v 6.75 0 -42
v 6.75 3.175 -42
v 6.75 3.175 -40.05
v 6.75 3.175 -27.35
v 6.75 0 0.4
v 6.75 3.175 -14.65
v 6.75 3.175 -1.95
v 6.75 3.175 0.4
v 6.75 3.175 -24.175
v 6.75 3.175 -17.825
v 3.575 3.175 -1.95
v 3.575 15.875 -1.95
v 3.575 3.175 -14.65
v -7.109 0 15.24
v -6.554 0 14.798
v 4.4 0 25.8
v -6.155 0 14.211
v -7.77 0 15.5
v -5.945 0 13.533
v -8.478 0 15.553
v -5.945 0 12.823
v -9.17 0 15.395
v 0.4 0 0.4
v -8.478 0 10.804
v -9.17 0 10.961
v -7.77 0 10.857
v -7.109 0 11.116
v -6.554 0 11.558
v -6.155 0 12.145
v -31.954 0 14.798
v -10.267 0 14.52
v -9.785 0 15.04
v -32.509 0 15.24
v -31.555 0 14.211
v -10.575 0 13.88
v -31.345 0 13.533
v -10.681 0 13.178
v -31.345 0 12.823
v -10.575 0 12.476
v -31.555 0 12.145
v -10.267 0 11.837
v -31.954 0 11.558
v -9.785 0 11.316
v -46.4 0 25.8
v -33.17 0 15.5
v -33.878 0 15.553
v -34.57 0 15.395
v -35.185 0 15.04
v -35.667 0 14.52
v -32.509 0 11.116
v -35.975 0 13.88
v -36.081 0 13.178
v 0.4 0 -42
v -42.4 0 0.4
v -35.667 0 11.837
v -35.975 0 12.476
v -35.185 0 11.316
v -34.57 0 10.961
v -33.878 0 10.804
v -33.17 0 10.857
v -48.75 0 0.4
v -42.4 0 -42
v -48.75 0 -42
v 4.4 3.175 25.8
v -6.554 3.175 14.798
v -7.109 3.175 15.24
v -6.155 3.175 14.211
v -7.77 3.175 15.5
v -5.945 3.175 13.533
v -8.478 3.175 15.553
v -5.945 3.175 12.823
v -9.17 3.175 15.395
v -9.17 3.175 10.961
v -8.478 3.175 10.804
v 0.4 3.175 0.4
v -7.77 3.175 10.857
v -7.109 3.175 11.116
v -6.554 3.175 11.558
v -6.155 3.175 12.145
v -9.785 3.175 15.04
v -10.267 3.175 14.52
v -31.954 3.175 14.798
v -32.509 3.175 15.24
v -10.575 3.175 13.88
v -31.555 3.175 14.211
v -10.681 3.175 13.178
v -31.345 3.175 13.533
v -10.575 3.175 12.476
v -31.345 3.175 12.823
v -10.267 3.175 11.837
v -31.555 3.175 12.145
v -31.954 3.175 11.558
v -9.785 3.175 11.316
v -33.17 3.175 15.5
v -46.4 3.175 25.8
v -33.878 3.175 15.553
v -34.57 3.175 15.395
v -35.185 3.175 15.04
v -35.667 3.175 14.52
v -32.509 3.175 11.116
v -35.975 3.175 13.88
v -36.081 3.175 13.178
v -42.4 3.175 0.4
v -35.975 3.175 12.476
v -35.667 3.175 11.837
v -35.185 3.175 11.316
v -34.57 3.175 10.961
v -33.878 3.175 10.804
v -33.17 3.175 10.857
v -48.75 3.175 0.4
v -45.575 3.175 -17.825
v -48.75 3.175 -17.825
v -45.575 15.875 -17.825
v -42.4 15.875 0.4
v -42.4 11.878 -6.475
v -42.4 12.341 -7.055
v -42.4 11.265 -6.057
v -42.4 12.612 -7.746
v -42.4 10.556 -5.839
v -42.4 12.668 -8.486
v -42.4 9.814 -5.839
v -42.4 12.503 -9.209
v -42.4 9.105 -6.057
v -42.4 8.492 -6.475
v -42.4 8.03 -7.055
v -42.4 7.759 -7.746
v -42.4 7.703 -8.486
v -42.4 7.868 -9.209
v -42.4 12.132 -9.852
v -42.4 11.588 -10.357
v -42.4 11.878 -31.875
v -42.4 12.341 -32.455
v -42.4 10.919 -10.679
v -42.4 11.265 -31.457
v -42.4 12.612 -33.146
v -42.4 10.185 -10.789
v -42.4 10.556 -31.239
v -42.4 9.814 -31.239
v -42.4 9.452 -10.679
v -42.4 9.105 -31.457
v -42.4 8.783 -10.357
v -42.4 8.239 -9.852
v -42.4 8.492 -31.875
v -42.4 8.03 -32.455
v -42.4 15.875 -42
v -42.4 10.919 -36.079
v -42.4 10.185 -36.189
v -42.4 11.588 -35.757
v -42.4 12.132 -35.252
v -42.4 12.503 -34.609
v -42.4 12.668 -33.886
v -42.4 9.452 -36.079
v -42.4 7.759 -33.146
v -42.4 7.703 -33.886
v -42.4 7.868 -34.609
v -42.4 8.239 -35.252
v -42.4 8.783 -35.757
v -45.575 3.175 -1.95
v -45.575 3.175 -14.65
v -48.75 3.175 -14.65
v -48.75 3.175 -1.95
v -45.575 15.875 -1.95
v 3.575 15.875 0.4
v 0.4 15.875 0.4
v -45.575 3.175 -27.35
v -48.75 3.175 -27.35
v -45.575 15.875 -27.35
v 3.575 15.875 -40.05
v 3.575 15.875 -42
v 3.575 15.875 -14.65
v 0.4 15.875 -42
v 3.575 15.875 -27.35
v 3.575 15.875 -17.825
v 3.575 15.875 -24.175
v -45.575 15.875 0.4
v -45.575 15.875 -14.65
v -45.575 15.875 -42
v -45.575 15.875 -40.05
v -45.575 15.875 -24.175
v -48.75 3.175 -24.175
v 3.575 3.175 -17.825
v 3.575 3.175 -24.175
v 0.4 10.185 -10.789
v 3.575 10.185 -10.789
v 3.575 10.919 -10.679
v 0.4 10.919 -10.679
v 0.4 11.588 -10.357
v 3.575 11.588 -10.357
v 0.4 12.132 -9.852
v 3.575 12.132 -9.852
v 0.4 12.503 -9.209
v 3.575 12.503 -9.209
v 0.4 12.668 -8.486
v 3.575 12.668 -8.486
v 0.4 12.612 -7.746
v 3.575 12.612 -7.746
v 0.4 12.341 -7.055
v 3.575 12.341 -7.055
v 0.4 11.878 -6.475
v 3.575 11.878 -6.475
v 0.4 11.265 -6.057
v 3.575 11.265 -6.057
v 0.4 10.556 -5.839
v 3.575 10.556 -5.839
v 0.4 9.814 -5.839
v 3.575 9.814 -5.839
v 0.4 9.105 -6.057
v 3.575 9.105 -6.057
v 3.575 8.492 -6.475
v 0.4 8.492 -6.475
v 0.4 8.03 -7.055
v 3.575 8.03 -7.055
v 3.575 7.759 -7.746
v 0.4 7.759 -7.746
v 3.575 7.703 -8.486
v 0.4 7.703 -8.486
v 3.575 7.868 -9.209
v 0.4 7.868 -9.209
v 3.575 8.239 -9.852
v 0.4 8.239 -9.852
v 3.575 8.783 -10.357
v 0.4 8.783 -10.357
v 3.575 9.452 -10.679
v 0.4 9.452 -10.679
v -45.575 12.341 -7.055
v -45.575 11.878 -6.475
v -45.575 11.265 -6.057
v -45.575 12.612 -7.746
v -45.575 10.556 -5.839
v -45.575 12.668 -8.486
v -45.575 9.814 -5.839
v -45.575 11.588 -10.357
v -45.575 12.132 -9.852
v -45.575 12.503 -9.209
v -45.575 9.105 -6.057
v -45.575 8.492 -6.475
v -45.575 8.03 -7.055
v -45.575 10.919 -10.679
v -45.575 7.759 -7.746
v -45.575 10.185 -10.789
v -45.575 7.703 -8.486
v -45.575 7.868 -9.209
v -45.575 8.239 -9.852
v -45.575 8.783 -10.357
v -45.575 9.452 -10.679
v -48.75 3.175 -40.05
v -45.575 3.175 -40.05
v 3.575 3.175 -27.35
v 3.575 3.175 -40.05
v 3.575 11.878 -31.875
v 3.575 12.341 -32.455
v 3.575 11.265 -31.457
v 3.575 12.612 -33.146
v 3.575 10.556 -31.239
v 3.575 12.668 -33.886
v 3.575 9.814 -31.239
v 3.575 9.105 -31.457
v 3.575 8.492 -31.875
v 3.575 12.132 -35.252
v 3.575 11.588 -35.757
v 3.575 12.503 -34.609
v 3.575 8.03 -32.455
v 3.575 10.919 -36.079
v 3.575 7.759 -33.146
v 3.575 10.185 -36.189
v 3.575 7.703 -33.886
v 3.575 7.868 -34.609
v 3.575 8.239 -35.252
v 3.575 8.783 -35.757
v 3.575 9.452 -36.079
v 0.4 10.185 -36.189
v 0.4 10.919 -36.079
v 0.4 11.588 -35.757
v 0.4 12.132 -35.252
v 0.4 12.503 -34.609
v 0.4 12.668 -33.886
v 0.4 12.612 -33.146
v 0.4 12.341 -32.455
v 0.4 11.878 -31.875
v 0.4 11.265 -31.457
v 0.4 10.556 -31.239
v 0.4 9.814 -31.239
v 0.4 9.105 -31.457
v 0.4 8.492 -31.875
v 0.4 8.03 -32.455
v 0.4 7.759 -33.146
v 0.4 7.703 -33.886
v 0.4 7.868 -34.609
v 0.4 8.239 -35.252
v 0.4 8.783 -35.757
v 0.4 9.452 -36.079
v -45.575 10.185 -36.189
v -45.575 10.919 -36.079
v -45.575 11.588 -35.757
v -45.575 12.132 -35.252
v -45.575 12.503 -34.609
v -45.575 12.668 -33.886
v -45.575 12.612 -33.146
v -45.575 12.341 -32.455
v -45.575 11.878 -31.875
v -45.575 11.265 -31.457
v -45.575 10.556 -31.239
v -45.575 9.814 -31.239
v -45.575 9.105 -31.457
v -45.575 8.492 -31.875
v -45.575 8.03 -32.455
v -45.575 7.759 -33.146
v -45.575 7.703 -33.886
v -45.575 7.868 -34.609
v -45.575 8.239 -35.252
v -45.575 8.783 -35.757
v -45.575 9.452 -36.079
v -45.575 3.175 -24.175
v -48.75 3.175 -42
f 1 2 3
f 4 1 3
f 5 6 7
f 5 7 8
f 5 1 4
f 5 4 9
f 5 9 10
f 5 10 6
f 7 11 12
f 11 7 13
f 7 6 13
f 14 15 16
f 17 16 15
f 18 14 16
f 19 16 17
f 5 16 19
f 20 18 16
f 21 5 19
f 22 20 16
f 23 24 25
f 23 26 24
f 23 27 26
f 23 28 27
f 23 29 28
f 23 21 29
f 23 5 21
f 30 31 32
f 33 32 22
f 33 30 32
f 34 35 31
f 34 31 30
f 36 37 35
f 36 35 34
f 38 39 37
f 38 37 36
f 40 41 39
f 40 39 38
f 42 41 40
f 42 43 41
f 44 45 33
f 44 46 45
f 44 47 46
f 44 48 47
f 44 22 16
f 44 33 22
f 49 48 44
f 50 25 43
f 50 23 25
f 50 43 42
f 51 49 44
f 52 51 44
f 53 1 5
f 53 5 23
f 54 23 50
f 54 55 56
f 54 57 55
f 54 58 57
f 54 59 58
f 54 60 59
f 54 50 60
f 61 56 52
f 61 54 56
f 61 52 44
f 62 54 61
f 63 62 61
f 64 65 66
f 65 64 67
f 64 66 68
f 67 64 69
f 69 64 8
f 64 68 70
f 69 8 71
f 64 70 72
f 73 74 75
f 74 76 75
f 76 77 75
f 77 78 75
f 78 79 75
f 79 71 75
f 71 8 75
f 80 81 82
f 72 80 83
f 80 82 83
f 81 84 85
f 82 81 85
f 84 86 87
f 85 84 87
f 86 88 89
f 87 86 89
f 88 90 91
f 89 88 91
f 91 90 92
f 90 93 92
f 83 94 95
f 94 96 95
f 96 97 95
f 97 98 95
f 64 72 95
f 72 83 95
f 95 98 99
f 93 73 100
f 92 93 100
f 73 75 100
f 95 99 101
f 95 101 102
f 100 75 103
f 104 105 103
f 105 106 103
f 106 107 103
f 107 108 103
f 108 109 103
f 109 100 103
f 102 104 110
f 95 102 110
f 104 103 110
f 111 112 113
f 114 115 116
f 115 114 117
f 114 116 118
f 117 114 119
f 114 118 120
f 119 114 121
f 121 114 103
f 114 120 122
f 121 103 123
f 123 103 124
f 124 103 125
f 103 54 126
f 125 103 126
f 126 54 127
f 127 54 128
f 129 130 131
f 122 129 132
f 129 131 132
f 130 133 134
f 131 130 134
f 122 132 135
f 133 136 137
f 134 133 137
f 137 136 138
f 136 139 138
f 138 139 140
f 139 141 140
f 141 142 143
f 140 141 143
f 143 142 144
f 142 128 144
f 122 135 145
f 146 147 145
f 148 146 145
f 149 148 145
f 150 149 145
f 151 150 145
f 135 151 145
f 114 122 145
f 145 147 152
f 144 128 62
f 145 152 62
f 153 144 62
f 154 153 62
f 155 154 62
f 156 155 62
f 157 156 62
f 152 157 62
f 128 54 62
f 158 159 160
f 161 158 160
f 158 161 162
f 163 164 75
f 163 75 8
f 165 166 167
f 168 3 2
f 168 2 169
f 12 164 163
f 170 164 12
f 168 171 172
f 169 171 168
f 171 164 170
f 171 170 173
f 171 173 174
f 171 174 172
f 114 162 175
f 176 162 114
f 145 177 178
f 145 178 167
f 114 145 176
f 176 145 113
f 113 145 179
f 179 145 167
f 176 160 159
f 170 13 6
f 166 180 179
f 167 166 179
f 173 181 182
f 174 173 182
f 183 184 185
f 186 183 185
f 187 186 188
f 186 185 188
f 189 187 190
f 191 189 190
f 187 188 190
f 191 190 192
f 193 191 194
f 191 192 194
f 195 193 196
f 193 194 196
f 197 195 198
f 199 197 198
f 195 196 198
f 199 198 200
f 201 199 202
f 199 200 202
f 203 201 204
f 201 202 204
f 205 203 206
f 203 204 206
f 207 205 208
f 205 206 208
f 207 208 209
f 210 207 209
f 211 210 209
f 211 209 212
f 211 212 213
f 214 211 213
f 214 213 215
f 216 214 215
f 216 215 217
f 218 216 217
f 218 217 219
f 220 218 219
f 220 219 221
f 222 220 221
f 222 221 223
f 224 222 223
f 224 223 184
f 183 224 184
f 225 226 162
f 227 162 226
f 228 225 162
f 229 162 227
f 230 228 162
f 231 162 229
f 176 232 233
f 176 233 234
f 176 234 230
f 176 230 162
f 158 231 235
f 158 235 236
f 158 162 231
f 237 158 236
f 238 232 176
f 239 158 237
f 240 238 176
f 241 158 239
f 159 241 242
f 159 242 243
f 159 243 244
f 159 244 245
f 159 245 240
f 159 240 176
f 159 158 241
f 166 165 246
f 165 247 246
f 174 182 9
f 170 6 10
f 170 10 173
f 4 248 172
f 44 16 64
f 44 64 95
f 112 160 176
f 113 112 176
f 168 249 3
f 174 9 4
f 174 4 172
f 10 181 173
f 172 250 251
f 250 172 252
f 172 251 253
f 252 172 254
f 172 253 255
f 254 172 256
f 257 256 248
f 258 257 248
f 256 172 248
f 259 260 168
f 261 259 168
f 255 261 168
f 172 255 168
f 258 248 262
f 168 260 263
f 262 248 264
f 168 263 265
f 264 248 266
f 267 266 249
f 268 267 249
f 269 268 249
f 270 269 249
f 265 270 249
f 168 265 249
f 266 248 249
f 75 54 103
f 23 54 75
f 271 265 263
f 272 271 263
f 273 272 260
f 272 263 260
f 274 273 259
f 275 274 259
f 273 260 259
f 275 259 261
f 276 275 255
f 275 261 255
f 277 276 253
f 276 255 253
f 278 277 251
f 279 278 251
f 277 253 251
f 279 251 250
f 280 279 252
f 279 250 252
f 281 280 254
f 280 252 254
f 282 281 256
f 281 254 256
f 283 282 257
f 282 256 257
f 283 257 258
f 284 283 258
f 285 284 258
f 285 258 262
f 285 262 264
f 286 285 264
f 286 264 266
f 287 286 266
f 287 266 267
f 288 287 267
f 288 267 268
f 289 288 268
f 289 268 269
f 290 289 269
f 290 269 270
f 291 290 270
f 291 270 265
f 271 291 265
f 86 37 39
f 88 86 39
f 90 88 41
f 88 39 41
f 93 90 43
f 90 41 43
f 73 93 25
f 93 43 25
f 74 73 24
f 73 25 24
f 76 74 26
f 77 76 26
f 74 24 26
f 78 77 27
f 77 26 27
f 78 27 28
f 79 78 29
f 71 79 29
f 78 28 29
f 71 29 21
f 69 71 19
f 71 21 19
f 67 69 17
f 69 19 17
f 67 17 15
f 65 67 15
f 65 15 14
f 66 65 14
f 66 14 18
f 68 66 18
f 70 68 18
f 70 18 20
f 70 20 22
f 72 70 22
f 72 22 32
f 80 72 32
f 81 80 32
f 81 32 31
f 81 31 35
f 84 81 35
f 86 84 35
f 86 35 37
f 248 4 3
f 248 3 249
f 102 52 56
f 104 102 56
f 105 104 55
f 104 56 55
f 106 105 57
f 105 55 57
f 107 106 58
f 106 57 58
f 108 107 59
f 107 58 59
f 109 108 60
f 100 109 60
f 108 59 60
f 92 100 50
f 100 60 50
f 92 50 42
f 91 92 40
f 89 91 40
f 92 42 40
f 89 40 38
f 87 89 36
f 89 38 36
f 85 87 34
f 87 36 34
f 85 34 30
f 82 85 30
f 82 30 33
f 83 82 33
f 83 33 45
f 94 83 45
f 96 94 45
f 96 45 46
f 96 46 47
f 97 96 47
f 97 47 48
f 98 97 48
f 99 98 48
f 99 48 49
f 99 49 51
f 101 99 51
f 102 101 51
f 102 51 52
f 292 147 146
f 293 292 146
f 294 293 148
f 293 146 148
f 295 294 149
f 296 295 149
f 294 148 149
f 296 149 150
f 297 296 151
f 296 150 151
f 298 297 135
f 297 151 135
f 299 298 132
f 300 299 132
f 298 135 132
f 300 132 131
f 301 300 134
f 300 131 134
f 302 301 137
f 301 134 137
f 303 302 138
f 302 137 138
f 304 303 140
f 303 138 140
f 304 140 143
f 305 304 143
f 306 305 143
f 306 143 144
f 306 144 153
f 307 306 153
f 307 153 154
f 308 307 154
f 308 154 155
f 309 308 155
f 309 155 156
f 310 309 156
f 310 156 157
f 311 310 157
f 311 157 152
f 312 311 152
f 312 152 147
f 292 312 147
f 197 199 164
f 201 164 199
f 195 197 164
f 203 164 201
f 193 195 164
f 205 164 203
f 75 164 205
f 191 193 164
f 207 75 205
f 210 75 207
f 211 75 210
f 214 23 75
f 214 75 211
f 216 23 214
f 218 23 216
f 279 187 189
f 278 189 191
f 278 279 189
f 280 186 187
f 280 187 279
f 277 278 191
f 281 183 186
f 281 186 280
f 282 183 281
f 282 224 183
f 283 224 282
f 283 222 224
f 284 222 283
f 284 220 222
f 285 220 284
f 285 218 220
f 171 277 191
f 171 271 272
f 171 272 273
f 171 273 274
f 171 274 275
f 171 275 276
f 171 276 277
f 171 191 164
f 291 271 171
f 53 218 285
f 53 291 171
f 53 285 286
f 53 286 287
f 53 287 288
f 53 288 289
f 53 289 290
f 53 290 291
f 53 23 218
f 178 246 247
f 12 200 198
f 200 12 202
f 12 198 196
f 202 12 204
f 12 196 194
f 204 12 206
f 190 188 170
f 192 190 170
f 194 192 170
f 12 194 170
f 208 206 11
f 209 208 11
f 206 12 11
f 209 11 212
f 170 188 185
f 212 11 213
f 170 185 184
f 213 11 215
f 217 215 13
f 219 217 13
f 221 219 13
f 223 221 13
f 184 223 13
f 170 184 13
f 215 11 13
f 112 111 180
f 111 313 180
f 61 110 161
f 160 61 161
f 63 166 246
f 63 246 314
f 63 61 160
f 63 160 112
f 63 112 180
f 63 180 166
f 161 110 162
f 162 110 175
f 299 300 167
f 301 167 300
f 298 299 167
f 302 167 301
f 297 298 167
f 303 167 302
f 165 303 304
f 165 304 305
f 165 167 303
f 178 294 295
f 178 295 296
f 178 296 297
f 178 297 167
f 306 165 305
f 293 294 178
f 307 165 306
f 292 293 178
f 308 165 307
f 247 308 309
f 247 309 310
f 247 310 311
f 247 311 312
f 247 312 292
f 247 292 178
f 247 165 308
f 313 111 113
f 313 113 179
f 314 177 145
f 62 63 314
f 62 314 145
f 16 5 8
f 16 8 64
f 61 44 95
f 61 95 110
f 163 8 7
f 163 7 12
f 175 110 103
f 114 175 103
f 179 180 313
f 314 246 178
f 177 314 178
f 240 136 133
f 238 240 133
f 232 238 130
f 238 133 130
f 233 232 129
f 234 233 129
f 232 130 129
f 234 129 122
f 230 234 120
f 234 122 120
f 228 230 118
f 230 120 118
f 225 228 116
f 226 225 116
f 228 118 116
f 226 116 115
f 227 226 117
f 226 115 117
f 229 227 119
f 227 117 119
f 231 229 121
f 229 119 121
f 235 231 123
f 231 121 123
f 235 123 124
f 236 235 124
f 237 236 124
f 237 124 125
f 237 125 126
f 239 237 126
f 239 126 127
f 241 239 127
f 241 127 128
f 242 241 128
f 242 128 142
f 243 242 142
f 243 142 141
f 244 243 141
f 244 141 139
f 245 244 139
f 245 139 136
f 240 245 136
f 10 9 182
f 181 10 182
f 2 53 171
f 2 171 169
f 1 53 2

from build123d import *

# Parameters (mm, degrees)
BOSS_EXTRUDE1_DEPTH            = 3.175
F_3_16_0_1875_DIAMETER_HOLE1_D = 4.7625
SKETCH6_W                      = 3.175
SKETCH6_H                      = 12.7
BOSS_EXTRUDE2_DEPTH            = 12.7
F_9_0_196_DIAMETER_HOLE1_D     = 4.9784
SKETCH9_W                      = 6.35
SKETCH9_H                      = 2.35
SKETCH9_H_2                    = 3.175
SKETCH9_H_3                    = 1.95
BOSS_EXTRUDE3_DEPTH            = 12.7
CUT_EXTRUDE1_DEPTH             = 67.530730681
SKETCH11_W                     = 3.175
SKETCH11_H                     = 6.35
BOSS_EXTRUDE4_DEPTH            = 12.7


with BuildPart() as part:
    # Sketch1 → Boss-Extrude1 (new body)
    with BuildSketch(Plane(origin=(0, 0, 0), x_dir=(1, 0, 0), z_dir=(0, 1, 0))):
        Polygon((0.4, -0.4), (0.4, 42), (6.75, 42), (6.75, -0.4), (4.4, -25.8), (-46.4, -25.8), (-48.75, -0.4), (-48.75, 42), (-42.4, 42), (-42.4, -0.4), align=None)
    extrude(amount=BOSS_EXTRUDE1_DEPTH)

    # 3/16 (0.1875) Diameter Hole1 (through all)
    with Locations(Plane(origin=(0, 3.175, 0), x_dir=(1, 0, 0), z_dir=(0, 1, 0))):
        with Locations((-33.7, -13.178131577), (-8.3, -13.178131577)):
            Hole(F_3_16_0_1875_DIAMETER_HOLE1_D / 2)

    # Sketch6 → Boss-Extrude2 (add)
    with BuildSketch(Plane(origin=(0, 3.175, 0), x_dir=(1, 0, 0), z_dir=(0, 1, 0))):
        with Locations((-43.9875, 8.3)):
            Rectangle(SKETCH6_W, SKETCH6_H)
        with Locations((-43.9875, 33.7)):
            Rectangle(SKETCH6_W, SKETCH6_H)
        with Locations((1.9875, 8.3)):
            Rectangle(SKETCH6_W, SKETCH6_H)
        with Locations((1.9875, 33.7)):
            Rectangle(SKETCH6_W, SKETCH6_H)
    extrude(amount=BOSS_EXTRUDE2_DEPTH)

    # #9 (0.196) Diameter Hole1 (through all)
    with Locations(Plane.ZY.offset(45.575)):
        with Locations((-8.3, 10.1854), (-33.7, 10.1854)):
            Hole(F_9_0_196_DIAMETER_HOLE1_D / 2)

    # Sketch9 → Boss-Extrude3 (add)
    with BuildSketch(Plane(origin=(0, 3.175, 0), x_dir=(1, 0, 0), z_dir=(0, 1, 0))):
        with Locations((-45.575, 0.775)):
            Rectangle(SKETCH9_W, SKETCH9_H)
        with Locations((3.575, 0.775)):
            Rectangle(SKETCH9_W, SKETCH9_H)
        with Locations((3.575, 16.2375)):
            Rectangle(SKETCH9_W, SKETCH9_H_2)
        with Locations((-45.575, 16.2375)):
            Rectangle(SKETCH9_W, SKETCH9_H_2)
        with Locations((3.575, 25.7625)):
            Rectangle(SKETCH9_W, SKETCH9_H_2)
        with Locations((3.575, 41.025)):
            Rectangle(SKETCH9_W, SKETCH9_H_3)
        with Locations((-45.575, 41.025)):
            Rectangle(SKETCH9_W, SKETCH9_H_3)
        with Locations((-45.575, 25.7625)):
            Rectangle(SKETCH9_W, SKETCH9_H_2)
    extrude(amount=BOSS_EXTRUDE3_DEPTH)

    # Sketch10 → Cut-Extrude1 (cut, through all)
    with BuildSketch(Plane.XY.offset(0.4)):
        Polygon((-48.75, 3.175), (-45.575, 15.875), (-48.75, 15.875), align=None)
        Polygon((6.75, 3.175), (3.575, 15.875), (6.75, 15.875), align=None)
    extrude(amount=-CUT_EXTRUDE1_DEPTH, mode=Mode.SUBTRACT)

    # Sketch11 → Boss-Extrude4 (add)
    with BuildSketch(Plane(origin=(0, 3.175, 0), x_dir=(1, 0, 0), z_dir=(0, 1, 0))):
        with Locations((-43.9875, 21)):
            Rectangle(SKETCH11_W, SKETCH11_H)
        with Locations((1.9875, 21)):
            Rectangle(SKETCH11_W, SKETCH11_H)
    extrude(amount=BOSS_EXTRUDE4_DEPTH)


solid = part.part
